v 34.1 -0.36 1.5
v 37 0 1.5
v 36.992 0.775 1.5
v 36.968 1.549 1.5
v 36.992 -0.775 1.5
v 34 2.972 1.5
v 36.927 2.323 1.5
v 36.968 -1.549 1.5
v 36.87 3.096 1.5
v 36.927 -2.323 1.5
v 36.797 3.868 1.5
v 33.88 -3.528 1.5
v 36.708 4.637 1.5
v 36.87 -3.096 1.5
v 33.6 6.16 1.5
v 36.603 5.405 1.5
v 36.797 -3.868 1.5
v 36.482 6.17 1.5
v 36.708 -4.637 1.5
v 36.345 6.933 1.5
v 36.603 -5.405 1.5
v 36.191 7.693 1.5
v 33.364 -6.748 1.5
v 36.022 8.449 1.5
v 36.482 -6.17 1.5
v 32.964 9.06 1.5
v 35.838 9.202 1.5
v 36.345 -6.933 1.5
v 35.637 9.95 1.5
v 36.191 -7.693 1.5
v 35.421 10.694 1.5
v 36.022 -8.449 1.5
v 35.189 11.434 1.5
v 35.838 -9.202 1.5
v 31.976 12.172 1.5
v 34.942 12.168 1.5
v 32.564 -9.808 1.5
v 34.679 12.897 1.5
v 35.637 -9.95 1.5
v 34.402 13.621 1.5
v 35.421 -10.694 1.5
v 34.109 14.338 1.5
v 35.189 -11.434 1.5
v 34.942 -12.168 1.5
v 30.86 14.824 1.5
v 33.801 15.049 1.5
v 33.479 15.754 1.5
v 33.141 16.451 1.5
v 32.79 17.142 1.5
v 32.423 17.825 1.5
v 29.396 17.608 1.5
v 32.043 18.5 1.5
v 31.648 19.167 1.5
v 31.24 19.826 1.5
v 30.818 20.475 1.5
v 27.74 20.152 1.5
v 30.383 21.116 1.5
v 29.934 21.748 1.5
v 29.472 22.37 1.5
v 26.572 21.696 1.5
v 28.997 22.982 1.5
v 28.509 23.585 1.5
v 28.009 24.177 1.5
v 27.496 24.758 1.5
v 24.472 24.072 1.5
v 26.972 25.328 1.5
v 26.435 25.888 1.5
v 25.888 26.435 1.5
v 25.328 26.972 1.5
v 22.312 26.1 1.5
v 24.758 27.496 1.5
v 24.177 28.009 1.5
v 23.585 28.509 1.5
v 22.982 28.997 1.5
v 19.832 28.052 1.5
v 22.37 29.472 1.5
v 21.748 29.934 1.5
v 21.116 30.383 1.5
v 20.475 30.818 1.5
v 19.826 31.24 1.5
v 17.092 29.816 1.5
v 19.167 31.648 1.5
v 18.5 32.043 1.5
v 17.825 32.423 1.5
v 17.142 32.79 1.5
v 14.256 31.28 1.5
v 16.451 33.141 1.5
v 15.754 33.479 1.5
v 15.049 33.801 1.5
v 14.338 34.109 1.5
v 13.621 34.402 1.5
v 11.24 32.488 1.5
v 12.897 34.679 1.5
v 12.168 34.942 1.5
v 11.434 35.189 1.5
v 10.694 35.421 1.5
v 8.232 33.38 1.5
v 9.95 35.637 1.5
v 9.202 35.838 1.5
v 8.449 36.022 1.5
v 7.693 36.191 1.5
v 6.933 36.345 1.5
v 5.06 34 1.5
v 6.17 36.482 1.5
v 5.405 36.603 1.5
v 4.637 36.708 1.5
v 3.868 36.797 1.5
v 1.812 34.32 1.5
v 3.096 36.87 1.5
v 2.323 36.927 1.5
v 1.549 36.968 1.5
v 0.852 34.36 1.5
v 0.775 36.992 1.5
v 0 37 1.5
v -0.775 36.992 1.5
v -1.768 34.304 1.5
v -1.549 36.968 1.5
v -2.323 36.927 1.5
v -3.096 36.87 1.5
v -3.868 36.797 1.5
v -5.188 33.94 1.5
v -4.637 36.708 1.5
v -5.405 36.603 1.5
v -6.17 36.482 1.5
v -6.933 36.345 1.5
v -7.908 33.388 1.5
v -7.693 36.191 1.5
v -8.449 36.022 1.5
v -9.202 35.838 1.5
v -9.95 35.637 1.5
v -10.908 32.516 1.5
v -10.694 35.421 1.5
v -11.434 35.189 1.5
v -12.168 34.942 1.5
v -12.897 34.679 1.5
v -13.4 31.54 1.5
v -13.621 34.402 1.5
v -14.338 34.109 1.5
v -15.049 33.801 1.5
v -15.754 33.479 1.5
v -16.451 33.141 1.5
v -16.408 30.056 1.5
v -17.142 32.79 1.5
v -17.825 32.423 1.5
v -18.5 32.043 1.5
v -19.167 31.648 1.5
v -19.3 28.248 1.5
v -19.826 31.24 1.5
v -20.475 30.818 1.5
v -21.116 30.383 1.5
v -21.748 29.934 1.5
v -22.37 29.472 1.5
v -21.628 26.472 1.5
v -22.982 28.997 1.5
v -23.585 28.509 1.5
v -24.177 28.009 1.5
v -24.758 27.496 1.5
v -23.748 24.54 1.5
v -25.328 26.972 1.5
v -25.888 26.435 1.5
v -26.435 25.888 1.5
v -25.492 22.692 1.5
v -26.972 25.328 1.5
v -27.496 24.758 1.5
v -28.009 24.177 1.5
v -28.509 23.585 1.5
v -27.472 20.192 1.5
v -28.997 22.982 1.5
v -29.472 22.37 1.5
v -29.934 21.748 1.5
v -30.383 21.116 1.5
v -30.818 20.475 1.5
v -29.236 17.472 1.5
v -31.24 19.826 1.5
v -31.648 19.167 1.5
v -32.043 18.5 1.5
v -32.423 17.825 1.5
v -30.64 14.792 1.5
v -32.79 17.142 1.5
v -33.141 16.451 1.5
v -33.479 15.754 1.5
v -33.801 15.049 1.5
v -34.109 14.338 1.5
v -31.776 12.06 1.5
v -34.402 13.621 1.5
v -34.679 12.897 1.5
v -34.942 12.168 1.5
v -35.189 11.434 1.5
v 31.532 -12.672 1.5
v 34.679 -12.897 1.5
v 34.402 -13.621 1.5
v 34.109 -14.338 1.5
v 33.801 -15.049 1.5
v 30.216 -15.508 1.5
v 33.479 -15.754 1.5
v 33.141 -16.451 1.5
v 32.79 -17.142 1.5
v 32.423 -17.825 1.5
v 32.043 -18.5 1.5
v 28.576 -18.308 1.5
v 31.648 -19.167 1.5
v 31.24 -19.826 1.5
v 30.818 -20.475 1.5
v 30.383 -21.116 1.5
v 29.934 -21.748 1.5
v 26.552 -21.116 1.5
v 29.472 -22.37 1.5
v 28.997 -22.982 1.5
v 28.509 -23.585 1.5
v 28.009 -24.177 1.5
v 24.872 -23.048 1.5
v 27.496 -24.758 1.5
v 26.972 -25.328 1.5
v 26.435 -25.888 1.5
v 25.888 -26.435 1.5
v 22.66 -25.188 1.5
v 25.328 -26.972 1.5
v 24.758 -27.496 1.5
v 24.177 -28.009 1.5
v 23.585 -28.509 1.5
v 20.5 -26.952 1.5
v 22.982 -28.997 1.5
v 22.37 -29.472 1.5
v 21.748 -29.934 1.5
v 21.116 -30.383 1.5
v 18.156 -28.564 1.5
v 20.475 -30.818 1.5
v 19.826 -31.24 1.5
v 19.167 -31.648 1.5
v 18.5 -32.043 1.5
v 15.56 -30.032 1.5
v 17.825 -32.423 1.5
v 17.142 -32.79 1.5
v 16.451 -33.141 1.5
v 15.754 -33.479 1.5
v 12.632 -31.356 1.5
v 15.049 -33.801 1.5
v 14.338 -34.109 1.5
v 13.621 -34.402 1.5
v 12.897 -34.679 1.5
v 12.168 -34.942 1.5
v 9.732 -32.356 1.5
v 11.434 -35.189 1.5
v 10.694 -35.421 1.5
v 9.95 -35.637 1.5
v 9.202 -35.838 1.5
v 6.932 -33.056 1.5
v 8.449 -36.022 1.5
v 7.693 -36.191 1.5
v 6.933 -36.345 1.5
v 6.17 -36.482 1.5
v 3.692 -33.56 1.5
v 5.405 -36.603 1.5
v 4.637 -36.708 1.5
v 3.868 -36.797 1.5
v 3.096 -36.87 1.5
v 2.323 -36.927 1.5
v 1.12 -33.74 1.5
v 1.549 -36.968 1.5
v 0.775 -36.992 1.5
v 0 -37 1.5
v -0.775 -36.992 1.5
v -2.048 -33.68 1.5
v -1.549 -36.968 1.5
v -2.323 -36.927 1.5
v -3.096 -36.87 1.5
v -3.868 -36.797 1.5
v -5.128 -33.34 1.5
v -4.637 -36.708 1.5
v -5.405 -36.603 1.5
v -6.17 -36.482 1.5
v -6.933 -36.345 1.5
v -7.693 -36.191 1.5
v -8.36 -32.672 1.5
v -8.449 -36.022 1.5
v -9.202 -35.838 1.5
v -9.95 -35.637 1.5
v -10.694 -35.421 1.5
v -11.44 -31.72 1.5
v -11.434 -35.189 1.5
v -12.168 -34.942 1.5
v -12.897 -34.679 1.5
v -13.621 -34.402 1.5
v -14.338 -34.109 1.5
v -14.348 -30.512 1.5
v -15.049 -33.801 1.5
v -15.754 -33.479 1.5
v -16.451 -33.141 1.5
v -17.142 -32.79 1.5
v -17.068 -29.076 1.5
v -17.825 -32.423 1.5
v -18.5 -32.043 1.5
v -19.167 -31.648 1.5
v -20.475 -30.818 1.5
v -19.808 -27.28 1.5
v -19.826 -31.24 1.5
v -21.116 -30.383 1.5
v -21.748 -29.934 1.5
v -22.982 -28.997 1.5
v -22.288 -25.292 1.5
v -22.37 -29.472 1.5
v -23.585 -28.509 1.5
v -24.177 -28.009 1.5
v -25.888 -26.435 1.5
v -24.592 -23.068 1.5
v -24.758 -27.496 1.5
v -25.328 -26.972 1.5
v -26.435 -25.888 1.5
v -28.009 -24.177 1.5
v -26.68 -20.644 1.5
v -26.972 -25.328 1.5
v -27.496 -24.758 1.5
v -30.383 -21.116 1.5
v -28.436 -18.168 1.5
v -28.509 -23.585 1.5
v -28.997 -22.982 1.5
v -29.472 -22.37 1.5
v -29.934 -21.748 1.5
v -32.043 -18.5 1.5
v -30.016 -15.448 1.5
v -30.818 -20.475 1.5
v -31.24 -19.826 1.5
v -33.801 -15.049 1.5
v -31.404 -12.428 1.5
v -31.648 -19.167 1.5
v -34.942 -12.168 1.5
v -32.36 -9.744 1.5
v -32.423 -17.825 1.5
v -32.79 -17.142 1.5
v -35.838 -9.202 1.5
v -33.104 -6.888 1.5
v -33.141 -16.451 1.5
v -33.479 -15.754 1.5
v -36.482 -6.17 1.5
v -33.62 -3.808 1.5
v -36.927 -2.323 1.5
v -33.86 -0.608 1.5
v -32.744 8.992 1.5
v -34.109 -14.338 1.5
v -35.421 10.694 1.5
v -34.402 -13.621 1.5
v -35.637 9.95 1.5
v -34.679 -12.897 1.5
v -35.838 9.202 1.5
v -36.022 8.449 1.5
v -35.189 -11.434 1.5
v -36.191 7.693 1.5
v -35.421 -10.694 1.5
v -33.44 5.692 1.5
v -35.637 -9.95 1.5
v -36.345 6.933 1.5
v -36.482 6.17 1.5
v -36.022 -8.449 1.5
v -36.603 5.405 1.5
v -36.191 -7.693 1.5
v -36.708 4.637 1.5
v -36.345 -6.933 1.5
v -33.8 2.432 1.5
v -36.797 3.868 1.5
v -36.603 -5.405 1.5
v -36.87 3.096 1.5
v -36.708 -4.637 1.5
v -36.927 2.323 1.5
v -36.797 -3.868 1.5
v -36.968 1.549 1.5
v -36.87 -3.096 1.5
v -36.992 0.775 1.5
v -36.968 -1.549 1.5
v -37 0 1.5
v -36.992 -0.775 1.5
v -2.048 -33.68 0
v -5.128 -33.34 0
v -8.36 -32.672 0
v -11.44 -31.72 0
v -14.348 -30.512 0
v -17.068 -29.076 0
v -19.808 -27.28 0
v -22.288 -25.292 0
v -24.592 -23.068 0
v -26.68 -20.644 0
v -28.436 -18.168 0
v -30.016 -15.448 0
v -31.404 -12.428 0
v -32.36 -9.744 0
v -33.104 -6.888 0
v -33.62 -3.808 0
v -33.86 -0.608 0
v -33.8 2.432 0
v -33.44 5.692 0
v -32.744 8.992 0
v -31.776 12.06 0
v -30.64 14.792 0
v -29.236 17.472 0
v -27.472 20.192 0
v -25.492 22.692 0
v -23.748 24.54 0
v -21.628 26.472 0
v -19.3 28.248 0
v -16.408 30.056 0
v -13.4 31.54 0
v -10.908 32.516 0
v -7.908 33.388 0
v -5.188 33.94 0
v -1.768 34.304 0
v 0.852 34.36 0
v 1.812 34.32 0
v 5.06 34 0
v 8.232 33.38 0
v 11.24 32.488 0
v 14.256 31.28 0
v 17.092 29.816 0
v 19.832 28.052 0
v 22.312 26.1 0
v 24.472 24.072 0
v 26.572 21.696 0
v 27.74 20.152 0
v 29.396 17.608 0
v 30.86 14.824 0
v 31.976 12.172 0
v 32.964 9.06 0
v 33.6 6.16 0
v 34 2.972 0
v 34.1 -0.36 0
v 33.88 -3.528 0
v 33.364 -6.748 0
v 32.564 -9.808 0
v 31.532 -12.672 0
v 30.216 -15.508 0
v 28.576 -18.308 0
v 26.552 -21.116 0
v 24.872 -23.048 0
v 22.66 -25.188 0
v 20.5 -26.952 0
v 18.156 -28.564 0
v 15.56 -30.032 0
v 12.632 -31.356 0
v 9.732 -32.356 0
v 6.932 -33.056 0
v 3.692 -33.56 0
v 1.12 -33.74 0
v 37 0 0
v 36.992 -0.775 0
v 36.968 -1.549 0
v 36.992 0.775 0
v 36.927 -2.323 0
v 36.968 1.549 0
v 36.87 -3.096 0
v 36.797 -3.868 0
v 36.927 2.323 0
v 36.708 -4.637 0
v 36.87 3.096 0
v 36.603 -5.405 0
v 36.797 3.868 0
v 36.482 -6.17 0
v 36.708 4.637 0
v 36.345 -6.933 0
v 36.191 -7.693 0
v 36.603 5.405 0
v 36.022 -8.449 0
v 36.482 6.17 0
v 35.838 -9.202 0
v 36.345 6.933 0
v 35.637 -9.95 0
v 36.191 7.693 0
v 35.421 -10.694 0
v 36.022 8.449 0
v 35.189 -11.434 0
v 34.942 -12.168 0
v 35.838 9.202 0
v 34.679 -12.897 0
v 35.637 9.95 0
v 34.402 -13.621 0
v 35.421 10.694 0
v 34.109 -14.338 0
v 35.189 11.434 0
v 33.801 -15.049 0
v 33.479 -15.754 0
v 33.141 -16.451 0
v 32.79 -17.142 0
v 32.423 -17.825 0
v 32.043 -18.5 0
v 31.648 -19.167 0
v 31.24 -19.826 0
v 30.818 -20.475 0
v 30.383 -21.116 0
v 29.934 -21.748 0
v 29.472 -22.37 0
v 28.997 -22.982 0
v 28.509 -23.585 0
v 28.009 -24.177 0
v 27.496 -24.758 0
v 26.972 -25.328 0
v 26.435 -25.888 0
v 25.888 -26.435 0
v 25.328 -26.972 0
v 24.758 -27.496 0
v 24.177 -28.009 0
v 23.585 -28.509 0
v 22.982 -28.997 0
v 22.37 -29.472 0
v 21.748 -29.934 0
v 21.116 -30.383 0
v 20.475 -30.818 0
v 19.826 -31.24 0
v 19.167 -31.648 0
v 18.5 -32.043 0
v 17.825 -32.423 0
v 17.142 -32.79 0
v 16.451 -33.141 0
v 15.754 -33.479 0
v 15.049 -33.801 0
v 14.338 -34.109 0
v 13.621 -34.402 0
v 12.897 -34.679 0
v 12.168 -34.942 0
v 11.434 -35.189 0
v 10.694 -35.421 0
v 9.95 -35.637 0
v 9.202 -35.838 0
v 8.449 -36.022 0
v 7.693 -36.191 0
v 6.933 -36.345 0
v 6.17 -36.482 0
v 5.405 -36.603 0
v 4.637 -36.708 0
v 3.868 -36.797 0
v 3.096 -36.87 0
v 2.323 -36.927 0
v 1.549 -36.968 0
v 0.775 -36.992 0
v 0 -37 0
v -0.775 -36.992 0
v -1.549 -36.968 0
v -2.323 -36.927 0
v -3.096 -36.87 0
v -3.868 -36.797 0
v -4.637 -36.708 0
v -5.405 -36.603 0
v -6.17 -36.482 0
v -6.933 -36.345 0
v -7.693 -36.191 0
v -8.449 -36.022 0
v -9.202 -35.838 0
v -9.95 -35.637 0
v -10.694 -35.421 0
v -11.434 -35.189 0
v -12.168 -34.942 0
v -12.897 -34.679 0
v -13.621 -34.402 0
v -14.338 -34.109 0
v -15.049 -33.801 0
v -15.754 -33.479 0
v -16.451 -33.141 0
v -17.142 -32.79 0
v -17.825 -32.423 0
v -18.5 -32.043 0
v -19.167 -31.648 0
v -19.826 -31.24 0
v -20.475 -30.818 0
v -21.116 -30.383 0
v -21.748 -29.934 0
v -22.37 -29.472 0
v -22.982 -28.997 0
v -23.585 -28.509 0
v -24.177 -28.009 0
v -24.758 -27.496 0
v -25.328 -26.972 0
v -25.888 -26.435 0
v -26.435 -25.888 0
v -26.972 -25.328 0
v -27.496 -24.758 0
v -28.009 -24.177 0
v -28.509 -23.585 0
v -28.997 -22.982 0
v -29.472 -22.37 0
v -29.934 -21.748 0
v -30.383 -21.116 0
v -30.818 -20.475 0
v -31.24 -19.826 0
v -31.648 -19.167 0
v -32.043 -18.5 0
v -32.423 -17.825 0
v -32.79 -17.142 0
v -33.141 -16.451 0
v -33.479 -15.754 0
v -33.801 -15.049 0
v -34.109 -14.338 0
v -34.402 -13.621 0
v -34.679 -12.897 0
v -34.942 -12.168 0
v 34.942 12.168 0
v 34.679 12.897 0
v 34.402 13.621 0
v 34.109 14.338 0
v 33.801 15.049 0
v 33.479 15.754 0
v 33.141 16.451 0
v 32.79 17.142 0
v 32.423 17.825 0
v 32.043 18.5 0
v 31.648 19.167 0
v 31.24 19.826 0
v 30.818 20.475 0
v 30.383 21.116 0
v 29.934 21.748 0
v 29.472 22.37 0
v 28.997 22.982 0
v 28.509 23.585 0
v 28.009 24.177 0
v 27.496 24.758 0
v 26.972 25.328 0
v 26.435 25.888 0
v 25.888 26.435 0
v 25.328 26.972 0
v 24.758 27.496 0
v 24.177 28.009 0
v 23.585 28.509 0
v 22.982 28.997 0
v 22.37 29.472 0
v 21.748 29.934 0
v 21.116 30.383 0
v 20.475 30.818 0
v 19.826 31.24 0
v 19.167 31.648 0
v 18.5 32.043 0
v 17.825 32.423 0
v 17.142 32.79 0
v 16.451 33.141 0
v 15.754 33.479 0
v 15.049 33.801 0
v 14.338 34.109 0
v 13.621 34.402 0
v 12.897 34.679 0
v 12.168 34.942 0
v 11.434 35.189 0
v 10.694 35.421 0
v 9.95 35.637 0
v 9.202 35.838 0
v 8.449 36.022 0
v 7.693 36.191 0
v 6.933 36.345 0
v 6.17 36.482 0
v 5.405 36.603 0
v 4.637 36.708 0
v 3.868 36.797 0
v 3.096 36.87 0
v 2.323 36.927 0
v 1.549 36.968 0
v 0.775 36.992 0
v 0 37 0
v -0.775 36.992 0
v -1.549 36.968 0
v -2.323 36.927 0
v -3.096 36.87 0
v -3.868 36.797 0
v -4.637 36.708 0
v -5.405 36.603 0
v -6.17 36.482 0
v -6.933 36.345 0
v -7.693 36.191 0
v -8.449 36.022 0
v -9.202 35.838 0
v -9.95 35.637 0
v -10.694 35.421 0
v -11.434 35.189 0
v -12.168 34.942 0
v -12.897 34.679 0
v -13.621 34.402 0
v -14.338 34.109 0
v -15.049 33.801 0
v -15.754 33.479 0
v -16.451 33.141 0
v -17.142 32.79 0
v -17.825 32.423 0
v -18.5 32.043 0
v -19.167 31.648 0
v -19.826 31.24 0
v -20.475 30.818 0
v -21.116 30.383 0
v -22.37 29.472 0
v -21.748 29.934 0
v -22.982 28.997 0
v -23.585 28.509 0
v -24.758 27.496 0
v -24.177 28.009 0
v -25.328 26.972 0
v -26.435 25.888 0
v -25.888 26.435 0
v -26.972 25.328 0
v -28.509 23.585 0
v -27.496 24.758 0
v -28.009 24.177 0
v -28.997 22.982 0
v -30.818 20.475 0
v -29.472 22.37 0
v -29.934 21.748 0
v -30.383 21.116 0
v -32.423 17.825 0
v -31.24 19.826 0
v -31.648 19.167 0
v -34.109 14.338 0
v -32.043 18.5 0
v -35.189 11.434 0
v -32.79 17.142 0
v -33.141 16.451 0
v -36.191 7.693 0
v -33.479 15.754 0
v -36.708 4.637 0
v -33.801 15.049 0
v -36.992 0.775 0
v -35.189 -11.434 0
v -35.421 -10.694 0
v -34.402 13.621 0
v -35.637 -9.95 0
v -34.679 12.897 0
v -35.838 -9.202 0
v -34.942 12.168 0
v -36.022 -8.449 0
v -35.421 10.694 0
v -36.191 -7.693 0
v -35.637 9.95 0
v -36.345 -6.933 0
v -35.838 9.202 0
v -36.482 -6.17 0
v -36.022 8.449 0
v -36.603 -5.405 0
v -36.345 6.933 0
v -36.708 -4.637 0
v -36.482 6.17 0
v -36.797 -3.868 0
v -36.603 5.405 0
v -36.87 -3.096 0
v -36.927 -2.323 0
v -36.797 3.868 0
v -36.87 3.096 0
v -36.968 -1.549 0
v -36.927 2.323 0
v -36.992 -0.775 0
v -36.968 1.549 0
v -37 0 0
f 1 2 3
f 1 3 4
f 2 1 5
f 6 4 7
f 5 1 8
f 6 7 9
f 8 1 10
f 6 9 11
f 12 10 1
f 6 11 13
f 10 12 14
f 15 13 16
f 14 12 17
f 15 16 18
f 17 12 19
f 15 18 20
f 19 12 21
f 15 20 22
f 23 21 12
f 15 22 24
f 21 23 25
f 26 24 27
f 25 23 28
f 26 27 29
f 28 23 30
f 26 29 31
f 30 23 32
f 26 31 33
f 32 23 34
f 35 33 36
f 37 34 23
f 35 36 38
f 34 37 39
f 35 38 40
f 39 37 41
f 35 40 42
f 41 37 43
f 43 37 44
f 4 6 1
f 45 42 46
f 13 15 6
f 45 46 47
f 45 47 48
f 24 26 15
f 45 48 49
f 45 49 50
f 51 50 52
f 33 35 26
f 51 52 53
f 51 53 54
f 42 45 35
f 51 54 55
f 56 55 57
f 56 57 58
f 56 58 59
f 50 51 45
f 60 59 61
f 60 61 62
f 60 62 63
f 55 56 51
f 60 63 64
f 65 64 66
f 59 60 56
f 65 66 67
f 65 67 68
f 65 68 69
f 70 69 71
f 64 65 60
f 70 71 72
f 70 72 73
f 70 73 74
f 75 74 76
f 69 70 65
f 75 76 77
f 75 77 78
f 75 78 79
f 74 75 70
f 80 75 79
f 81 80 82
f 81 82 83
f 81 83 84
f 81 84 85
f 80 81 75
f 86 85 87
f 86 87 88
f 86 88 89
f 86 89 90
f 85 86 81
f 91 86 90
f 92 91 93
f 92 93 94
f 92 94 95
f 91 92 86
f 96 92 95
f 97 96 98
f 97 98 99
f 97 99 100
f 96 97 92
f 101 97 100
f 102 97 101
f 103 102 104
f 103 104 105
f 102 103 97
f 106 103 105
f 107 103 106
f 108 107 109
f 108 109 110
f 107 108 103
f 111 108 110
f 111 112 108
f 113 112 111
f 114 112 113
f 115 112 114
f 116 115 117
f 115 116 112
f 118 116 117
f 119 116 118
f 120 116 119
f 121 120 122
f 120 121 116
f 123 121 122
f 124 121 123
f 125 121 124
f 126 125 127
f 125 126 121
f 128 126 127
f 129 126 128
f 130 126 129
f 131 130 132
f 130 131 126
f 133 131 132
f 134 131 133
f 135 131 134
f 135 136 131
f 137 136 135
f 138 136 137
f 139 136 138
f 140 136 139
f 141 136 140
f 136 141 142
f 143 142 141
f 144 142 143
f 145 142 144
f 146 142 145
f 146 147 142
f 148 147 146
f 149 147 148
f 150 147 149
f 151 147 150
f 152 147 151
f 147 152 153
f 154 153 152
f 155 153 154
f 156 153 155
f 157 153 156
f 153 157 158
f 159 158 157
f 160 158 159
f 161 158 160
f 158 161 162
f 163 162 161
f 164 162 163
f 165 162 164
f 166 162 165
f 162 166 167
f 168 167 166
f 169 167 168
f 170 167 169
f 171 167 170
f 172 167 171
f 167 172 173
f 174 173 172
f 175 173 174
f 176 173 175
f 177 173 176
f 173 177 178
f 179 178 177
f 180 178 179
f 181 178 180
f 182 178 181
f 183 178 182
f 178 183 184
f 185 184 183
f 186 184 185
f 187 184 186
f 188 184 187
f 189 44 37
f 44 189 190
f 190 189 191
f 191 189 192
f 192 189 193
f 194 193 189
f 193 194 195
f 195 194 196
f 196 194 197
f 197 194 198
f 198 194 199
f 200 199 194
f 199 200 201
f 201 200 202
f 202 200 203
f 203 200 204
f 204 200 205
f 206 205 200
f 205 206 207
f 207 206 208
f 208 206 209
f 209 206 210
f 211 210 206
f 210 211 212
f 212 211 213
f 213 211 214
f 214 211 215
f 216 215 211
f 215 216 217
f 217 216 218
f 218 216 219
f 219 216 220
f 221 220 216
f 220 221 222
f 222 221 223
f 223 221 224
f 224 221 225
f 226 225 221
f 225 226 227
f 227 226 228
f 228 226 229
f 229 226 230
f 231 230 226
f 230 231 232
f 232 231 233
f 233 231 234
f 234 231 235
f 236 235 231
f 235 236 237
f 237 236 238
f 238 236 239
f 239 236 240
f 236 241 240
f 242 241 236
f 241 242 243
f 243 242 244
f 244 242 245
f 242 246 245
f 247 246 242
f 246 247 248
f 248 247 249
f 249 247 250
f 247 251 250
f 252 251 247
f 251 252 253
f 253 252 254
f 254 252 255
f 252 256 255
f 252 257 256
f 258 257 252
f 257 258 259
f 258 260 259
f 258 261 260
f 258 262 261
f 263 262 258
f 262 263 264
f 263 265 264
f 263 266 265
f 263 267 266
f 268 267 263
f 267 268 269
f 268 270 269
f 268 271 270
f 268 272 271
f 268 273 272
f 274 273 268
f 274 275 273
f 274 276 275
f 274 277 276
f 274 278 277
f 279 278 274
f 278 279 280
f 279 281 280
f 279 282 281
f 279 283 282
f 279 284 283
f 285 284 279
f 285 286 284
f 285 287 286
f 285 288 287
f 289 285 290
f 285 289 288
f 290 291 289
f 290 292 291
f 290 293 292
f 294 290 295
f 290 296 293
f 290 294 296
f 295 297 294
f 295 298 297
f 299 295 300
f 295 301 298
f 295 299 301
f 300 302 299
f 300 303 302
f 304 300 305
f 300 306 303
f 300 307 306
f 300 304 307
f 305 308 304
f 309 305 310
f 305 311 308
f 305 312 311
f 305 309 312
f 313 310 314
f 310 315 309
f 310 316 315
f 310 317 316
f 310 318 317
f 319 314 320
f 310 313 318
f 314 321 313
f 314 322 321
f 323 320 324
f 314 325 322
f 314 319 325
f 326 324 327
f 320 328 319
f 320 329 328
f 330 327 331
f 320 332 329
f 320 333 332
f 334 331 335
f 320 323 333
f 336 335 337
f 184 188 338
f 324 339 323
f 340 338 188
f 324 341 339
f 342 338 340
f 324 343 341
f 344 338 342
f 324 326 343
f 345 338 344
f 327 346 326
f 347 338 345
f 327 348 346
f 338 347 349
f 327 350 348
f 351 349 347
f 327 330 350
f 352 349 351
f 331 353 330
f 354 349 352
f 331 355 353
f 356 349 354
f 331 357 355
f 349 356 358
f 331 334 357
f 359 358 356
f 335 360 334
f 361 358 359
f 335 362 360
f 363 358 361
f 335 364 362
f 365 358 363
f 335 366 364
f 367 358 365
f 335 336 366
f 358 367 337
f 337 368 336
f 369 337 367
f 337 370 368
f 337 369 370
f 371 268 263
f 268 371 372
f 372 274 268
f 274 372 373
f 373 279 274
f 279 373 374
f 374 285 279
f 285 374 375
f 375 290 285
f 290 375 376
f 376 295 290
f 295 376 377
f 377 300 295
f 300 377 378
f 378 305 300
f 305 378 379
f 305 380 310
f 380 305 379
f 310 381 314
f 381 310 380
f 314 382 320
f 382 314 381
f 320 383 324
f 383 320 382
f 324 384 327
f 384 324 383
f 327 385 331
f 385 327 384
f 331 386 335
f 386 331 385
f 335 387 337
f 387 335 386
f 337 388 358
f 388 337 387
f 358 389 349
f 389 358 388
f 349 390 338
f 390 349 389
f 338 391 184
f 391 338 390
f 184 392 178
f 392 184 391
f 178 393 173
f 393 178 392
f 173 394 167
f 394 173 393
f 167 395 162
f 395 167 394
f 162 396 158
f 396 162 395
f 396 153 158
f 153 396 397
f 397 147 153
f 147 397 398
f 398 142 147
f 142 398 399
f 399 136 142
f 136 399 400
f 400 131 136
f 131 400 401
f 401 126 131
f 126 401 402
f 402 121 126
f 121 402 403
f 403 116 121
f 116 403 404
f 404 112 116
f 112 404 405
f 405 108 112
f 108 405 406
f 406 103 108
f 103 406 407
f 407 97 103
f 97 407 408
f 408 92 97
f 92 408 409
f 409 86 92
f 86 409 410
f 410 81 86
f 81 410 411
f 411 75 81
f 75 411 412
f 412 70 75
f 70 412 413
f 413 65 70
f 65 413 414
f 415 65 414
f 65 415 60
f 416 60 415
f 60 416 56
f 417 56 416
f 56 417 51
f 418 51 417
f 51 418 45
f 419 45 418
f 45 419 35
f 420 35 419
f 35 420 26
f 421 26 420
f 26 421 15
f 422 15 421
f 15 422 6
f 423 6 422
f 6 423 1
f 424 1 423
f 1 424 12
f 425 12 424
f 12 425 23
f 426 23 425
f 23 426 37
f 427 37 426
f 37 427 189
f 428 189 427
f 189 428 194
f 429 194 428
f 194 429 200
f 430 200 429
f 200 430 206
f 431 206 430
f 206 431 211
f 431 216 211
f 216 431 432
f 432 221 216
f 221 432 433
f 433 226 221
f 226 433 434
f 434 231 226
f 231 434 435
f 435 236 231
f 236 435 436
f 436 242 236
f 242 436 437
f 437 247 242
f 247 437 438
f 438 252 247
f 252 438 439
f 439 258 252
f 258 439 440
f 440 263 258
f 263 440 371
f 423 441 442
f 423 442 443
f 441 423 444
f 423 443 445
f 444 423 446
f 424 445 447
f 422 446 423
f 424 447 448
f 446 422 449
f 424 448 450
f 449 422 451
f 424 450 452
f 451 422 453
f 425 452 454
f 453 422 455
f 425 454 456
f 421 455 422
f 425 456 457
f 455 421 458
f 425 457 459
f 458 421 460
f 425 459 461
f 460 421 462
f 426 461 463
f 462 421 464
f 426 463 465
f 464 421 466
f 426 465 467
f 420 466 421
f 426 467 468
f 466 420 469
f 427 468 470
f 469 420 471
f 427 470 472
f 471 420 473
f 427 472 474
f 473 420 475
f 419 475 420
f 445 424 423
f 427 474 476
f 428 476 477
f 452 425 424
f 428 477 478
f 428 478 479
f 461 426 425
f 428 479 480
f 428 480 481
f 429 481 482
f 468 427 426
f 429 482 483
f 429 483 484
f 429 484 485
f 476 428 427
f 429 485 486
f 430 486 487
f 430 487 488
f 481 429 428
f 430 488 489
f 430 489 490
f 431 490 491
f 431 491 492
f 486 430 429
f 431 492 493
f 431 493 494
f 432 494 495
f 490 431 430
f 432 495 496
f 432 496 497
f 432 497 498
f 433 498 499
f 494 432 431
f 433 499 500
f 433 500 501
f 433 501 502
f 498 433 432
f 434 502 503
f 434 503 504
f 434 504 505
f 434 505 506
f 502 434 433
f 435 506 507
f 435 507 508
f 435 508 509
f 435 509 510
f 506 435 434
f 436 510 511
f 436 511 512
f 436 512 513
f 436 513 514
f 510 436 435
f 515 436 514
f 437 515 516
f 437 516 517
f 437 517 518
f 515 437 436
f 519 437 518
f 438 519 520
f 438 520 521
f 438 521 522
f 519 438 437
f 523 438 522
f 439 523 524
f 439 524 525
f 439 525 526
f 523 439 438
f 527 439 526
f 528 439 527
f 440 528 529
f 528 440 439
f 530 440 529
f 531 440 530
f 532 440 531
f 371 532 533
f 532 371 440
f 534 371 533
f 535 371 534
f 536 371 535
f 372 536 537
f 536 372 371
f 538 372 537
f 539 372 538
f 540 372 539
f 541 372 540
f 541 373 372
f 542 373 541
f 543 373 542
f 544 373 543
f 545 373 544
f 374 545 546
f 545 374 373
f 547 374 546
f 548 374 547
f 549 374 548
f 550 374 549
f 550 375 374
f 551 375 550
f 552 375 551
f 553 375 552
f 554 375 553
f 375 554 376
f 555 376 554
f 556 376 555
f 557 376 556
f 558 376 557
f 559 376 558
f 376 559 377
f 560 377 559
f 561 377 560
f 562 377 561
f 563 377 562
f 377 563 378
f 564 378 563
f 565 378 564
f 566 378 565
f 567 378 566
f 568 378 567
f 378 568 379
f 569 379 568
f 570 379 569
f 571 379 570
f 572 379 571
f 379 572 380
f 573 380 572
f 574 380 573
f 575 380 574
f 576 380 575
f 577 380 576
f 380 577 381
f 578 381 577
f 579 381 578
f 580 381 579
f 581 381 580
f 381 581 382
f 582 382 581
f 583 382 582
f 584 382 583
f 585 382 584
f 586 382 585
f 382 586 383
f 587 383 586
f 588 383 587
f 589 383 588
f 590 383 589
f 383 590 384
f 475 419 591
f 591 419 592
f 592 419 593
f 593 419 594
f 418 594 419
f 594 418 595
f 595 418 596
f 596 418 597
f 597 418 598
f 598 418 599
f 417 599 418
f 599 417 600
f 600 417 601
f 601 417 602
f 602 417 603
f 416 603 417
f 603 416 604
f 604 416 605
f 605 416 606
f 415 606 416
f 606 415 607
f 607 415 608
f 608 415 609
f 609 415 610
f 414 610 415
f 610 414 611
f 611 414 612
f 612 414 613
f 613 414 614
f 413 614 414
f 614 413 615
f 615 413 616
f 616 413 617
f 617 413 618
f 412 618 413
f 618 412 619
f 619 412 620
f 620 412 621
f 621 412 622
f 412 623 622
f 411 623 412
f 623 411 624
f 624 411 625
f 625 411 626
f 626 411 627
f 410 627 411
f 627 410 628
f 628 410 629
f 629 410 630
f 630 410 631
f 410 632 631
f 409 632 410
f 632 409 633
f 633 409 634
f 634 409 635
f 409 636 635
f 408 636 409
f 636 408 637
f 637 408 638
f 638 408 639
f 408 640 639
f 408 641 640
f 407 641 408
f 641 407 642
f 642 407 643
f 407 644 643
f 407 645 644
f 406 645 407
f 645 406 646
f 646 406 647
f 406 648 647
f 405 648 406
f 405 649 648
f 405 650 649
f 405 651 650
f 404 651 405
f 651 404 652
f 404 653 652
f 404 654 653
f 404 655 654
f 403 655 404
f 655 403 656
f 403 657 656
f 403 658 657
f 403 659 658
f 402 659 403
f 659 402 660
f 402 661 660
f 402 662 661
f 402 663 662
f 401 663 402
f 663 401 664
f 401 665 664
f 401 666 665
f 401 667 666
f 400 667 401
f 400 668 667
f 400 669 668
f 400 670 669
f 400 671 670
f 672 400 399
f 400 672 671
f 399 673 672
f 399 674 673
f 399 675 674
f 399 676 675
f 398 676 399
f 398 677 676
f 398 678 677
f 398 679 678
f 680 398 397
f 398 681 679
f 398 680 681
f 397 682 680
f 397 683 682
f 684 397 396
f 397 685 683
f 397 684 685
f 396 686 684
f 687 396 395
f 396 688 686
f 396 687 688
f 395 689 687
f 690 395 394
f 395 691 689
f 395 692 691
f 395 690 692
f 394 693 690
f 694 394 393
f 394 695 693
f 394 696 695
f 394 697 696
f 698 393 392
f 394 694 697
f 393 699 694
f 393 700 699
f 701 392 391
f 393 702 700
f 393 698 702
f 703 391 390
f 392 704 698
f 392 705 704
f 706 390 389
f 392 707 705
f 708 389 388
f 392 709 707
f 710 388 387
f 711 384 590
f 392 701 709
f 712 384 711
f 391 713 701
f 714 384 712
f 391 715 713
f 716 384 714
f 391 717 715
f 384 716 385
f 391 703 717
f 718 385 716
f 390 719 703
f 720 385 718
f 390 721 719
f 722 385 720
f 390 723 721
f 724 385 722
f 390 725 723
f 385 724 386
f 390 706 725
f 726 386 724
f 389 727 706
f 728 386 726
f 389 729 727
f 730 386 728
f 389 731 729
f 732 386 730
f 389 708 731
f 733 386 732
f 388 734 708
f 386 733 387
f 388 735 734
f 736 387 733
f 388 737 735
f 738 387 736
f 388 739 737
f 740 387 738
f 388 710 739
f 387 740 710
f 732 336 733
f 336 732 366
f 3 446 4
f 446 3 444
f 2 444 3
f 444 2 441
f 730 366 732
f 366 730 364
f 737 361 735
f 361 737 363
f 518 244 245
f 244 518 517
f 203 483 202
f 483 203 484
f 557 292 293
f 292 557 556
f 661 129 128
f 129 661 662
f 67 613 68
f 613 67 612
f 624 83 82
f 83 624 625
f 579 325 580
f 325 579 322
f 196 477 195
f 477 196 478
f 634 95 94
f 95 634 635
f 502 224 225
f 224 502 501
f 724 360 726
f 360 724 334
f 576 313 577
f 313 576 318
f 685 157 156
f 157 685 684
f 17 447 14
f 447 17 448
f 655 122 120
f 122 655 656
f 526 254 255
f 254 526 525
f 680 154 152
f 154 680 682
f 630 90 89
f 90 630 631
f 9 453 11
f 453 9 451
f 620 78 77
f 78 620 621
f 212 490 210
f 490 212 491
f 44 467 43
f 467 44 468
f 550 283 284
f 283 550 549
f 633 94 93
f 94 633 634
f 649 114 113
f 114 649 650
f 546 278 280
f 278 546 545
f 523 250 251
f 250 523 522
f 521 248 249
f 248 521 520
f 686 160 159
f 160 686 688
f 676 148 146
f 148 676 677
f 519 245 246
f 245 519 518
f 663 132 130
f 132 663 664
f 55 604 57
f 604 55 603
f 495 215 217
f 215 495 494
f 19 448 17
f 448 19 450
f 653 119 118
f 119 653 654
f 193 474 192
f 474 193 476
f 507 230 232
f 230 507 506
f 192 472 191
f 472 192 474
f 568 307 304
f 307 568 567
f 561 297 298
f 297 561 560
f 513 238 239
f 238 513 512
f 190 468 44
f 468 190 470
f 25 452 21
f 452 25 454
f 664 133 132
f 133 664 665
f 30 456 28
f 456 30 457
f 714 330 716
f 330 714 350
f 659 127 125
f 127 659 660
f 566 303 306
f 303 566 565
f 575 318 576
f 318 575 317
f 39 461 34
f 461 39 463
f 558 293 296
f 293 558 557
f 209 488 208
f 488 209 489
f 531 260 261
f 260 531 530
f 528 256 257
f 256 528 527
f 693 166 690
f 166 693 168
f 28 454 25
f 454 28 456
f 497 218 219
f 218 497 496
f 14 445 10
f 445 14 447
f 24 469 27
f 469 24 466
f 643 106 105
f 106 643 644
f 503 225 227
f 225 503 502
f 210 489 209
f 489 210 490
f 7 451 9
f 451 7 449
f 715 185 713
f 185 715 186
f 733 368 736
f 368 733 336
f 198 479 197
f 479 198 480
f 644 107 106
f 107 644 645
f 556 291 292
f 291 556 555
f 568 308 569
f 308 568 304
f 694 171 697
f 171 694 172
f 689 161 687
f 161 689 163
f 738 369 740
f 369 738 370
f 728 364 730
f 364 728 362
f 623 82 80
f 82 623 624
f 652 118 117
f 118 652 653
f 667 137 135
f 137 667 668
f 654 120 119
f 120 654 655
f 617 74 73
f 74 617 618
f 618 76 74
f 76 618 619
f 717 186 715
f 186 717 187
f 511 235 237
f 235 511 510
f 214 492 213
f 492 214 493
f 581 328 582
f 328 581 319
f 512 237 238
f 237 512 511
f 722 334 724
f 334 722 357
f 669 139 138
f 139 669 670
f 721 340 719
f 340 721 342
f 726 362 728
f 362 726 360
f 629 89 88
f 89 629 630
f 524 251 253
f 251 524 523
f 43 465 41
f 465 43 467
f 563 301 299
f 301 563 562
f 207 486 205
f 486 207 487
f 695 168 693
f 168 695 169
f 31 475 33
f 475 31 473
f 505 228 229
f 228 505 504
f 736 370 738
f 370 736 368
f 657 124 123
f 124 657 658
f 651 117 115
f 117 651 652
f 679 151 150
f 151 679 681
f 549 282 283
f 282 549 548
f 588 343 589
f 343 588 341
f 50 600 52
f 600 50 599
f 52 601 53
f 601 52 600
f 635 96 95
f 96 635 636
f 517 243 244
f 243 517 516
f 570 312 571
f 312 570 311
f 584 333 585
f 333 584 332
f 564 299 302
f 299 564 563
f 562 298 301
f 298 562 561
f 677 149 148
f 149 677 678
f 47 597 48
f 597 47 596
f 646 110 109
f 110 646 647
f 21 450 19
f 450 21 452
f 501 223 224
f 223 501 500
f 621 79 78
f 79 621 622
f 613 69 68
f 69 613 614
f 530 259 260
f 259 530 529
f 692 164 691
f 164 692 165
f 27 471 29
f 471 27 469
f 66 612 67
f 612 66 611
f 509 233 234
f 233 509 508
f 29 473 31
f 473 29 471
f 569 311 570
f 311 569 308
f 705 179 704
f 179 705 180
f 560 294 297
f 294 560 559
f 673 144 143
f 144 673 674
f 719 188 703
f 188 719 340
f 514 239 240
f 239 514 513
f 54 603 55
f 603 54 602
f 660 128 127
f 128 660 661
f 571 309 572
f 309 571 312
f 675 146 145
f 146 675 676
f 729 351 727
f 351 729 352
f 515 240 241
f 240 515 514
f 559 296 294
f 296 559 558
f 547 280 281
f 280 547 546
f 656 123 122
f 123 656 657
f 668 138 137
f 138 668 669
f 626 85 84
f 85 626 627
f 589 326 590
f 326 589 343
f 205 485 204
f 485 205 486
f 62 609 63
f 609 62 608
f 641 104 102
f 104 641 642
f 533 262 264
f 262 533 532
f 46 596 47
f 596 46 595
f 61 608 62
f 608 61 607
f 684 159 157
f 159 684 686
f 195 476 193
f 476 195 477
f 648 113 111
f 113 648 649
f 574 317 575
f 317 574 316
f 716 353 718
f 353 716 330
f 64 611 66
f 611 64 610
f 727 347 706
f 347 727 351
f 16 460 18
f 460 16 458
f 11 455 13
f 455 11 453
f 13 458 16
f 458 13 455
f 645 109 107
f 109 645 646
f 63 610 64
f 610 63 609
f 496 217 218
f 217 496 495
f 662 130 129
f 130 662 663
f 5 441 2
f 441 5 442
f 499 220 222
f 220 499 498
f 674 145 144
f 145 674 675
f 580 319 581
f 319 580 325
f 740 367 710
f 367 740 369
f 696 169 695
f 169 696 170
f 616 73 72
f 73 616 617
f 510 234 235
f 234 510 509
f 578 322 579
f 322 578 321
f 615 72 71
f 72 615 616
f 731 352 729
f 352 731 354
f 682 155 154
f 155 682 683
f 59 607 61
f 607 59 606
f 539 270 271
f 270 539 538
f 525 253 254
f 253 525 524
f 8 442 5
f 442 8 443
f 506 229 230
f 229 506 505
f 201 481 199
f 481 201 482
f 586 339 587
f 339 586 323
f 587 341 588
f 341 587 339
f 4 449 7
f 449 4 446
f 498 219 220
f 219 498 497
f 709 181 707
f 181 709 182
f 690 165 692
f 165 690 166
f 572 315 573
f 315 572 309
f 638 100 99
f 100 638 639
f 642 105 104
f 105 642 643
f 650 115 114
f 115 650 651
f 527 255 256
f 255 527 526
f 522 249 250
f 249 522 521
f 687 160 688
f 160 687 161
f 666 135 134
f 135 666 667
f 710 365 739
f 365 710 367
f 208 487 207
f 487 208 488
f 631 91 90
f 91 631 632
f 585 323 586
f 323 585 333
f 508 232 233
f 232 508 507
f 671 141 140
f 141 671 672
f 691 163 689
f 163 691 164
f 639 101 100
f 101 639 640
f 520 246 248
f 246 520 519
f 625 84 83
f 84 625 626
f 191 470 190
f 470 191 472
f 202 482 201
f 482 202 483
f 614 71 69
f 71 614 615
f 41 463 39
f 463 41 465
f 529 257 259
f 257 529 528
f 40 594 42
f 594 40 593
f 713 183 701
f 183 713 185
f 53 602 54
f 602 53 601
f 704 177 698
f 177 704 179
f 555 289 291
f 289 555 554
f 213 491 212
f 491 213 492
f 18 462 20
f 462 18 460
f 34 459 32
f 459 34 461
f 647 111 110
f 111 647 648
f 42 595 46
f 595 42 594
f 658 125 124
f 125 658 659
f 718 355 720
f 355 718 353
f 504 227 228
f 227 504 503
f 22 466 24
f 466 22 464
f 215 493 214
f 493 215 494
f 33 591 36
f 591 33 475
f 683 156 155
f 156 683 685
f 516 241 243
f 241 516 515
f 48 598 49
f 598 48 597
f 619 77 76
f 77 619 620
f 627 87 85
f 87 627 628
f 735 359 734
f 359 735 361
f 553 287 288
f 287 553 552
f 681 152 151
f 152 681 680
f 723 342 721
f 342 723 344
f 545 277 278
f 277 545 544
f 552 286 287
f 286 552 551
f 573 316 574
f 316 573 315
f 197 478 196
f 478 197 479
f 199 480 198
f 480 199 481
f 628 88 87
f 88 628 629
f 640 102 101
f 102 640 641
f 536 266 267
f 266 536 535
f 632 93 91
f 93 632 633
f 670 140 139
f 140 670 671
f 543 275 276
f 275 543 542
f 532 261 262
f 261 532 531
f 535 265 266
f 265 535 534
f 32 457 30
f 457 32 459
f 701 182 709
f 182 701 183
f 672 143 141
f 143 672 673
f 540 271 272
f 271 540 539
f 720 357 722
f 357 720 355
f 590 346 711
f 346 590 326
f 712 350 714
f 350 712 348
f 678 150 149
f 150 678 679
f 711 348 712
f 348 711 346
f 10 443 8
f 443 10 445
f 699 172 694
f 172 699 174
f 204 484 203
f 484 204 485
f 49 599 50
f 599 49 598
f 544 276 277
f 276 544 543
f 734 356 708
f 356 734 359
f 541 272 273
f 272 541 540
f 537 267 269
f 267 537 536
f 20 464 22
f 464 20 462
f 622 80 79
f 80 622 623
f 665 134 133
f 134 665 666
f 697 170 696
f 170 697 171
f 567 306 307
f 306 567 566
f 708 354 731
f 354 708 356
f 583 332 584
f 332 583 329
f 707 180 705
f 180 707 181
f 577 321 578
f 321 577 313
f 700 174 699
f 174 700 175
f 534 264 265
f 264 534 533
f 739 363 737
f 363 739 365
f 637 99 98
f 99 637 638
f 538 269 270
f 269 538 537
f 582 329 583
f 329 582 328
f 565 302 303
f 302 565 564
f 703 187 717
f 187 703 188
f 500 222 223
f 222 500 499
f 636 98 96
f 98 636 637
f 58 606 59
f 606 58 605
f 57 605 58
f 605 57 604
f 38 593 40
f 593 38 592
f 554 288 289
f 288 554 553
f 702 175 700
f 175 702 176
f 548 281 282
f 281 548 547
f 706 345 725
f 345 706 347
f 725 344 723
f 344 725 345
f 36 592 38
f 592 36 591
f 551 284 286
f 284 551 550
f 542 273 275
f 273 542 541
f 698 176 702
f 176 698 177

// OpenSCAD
// file: CrickCoin3text.scad
module CrickCoin3text_1()
{
 /* Generated by trace2scad version 20150415
    http://aggregate.org/MAKE/TRACE2SCAD/
    Optimized model has 221/1642 original points
 */
 color([0.5, 0.5, 0.5])
 assign(minx=0) /* polygon minx=0 */
 assign(miny=0) /* polygon miny=0 */
 assign(maxx=20000) /* polygon maxx=20000 */
 assign(maxy=19690) /* polygon maxy=19690 */
 assign(dx=maxx-minx)
 assign(dy=maxy-miny)
 assign(maxd=((dx>dy)?dx:dy))
 scale([1/maxd, 1/maxd, 1])
 translate([-minx-dx/2, -miny-dy/2, 0])
 linear_extrude(height=1, convexity=221)
 union() {
  union() {
   polygon([[1,18799],[3,17908],[221,17839],[472,17805],[701,17833],[908,17890],[1153,18025],[1430,18292],[1584,18588],[1629,18742],[1660,18993],[1623,19271],[1575,19428],[1438,19676],[1425,19690],[0,19690]], convexity=5);
   polygon([[18275,19684],[18275,19678],[18190,19480],[18139,19274],[18133,19174],[18133,19061],[18165,18838],[18210,18684],[18345,18443],[18390,18373],[18617,18160],[18878,18016],[19060,17965],[19152,17947],[19364,17930],[19474,17948],[19726,18011],[20000,18151],[20000,19690],[18275,19690]], convexity=7);
   polygon([[5228,15624],[5158,15620],[4708,15554],[4315,15427],[3984,15245],[3742,15043],[3520,14774],[3360,14466],[3256,14108],[3214,13813],[3222,13351],[3301,12933],[3432,12608],[3588,12359],[3823,12108],[4113,11902],[4473,11740],[4903,11636],[5413,11596],[5925,11637],[6365,11734],[6600,11812],[6600,11843],[6633,11863],[6675,11943],[6680,12698],[6631,12836],[6537,12895],[6467,12895],[6383,12853],[6297,12719],[6272,12683],[6130,12598],[6061,12539],[5783,12485],[5482,12480],[5238,12513],[4977,12614],[4779,12768],[4635,12954],[4535,13193],[4485,13501],[4495,13846],[4569,14133],[4691,14361],[4883,14554],[5093,14669],[5373,14740],[5723,14750],[5876,14720],[6100,14613],[6472,14363],[6542,14345],[6618,14365],[6669,14396],[6705,14471],[6690,14813],[6685,15328],[6619,15433],[6518,15495],[6353,15522],[6289,15551],[6103,15554],[5678,15620],[5298,15628]], convexity=12);
   polygon([[11264,15383],[11226,15363],[11170,15267],[11170,15098],[11258,14950],[11365,14778],[11475,14418],[11970,12538],[11977,12212],[12039,12104],[12107,12070],[12200,12060],[12308,12055],[12411,12068],[13148,12050],[13229,12095],[13270,12175],[13260,12274],[13244,12287],[13265,12463],[13617,13886],[13693,13940],[13753,13940],[13823,13878],[14145,12562],[14154,12418],[14160,12268],[14155,12184],[14210,12094],[14277,12060],[14898,12075],[15128,12081],[15186,12050],[15268,12050],[15356,12108],[15410,12205],[15410,12328],[16026,14638],[16100,14845],[16157,14984],[16225,15133],[16225,15204],[16173,15294],[16098,15330],[15762,15300],[15674,15289],[15604,15310],[15265,15320],[15174,15265],[15140,15198],[15126,14998],[15056,14643],[14752,13441],[14723,13395],[14639,13404],[14586,13443],[14295,14623],[14270,14915],[14240,15028],[14235,15088],[14240,15173],[14178,15280],[14103,15320],[13465,15310],[13389,15330],[13317,15312],[13265,15279],[13225,15201],[13208,14898],[12858,13498],[12798,13450],[12696,13460],[12652,13509],[12367,14720],[12350,14890],[12330,14925],[12323,15013],[12305,15051],[12305,15198],[12248,15301],[12170,15340],[11868,15335],[11468,15361],[11379,15405],[11303,15404]], convexity=31);
   polygon([[19317,1895],[19313,1891],[19054,1852],[18793,1743],[18637,1640],[18420,1407],[18319,1238],[18230,1004],[18192,716],[18215,488],[18257,332],[18390,63],[18428,3],[20000,0],[20000,1719],[19773,1825],[19567,1880],[19322,1900]], convexity=6);
   polygon([[417,1770],[413,1766],[194,1738],[3,1672],[0,0],[1498,0],[1595,225],[1629,342],[1650,479],[1655,643],[1623,863],[1544,1085],[1415,1303],[1173,1545],[875,1700],[665,1755],[422,1775]], convexity=5);
  }
 }
}

module CrickCoin3text()
{
 /* all layers combined, scaled to within a 1mm cube */
 scale([1, 1, 1/1])
 difference() {
  union() {
   scale([1,1,2]) translate([0,0,-0.5]) CrickCoin3text_1();
  }
  translate([0,0,-2]) cube([2,2,4],center=true);
 }
}
CrickCoin3text();
// file: CrickCoin3white.scad
module CrickCoin3white_1()
{
 /* Generated by trace2scad version 20150415
    http://aggregate.org/MAKE/TRACE2SCAD/
    Optimized model has 217/2306 original points
 */
 color([0.5, 0.5, 0.5])
 assign(minx=0) /* polygon minx=0 */
 assign(miny=0) /* polygon miny=0 */
 assign(maxx=20000) /* polygon maxx=20000 */
 assign(maxy=19690) /* polygon maxy=19690 */
 assign(dx=maxx-minx)
 assign(dy=maxy-miny)
 assign(maxd=((dx>dy)?dx:dy))
 scale([1/maxd, 1/maxd, 1])
 translate([-minx-dx/2, -miny-dy/2, 0])
 linear_extrude(height=1, convexity=217)
 union() {
  union() {
   polygon([[1,18799],[3,17908],[221,17839],[472,17805],[701,17833],[908,17890],[1153,18025],[1430,18292],[1584,18588],[1629,18742],[1660,18993],[1623,19271],[1575,19428],[1438,19676],[1425,19690],[0,19690]], convexity=5);
   polygon([[18275,19684],[18275,19678],[18190,19480],[18139,19274],[18133,19174],[18133,19061],[18165,18838],[18210,18684],[18345,18443],[18390,18373],[18617,18160],[18878,18016],[19060,17965],[19152,17947],[19364,17930],[19474,17948],[19726,18011],[20000,18151],[20000,19690],[18275,19690]], convexity=7);
   union() {
    difference() {
     polygon([[9773,19182],[9718,19180],[8873,19120],[7988,18976],[7175,18765],[6498,18531],[5833,18244],[5096,17850],[4363,17369],[3699,16841],[3097,16268],[2607,15718],[2098,15036],[1666,14338],[1281,13563],[979,12783],[740,11942],[589,11128],[510,10283],[504,9644],[560,8823],[704,7938],[915,7135],[1174,6408],[1514,5663],[1945,4913],[2375,4295],[2908,3651],[3556,3003],[4169,2493],[4825,2033],[5523,1629],[6286,1270],[7128,965],[7968,745],[8790,607],[9468,546],[9981,529],[10883,575],[11771,700],[12613,899],[13443,1176],[14106,1460],[14877,1872],[15563,2320],[16203,2822],[16744,3324],[17328,3964],[17799,4583],[18245,5288],[18623,6023],[18921,6753],[19154,7498],[19328,8298],[19430,9088],[19466,9859],[19420,10743],[19299,11583],[19115,12358],[18863,13123],[18575,13801],[18159,14578],[17698,15275],[17248,15848],[16943,16192],[16371,16747],[15728,17275],[15083,17719],[14408,18105],[13608,18475],[12805,18760],[11998,18971],[11133,19115],[10288,19180],[9828,19184]], convexity=6);
     polygon([[10333,18430],[10453,18425],[11265,18345],[12058,18190],[12810,17967],[13564,17665],[14273,17299],[14958,16858],[15578,16370],[16118,15863],[16643,15269],[16935,14883],[17349,14247],[17715,13551],[17994,12888],[18241,12110],[18400,11385],[18500,10588],[18525,9755],[18470,8963],[18341,8158],[18141,7393],[17883,6677],[17554,5968],[17144,5268],[16638,4566],[16218,4083],[15665,3548],[15125,3107],[14539,2704],[13890,2337],[13158,2006],[12433,1756],[11733,1581],[10923,1455],[10280,1410],[9488,1425],[8718,1510],[7910,1677],[7140,1915],[6413,2217],[5733,2576],[5048,3025],[4428,3522],[3852,4078],[3330,4684],[2891,5303],[2496,5983],[2149,6738],[1910,7409],[1724,8123],[1595,8893],[1535,9693],[1550,10453],[1640,11268],[1814,12093],[2056,12860],[2340,13543],[2691,14213],[3132,14893],[3627,15518],[4063,15980],[4593,16463],[5175,16907],[5898,17359],[6650,17730],[7273,17974],[8023,18192],[8703,18330],[9558,18421],[10213,18435]], convexity=6);
    }
   }
   polygon([[19317,1895],[19313,1891],[19054,1852],[18793,1743],[18637,1640],[18420,1407],[18319,1238],[18230,1004],[18192,716],[18215,488],[18257,332],[18390,63],[18428,3],[20000,0],[20000,1719],[19773,1825],[19567,1880],[19322,1900]], convexity=6);
   polygon([[417,1770],[413,1766],[194,1738],[3,1672],[0,0],[1498,0],[1595,225],[1629,342],[1650,479],[1655,643],[1623,863],[1544,1085],[1415,1303],[1173,1545],[875,1700],[665,1755],[422,1775]], convexity=5);
  }
 }
}

module CrickCoin3white()
{
 /* all layers combined, scaled to within a 1mm cube */
 scale([1, 1, 1/1])
 difference() {
  union() {
   scale([1,1,2]) translate([0,0,-0.5]) CrickCoin3white_1();
  }
  translate([0,0,-2]) cube([2,2,4],center=true);
 }
}
CrickCoin3white();
// file: CrickCoin3purple.scad
module CrickCoin3purple_1()
{
 /* Generated by trace2scad version 20150415
    http://aggregate.org/MAKE/TRACE2SCAD/
    Optimized model has 222/2741 original points
 */
 color([0.5, 0.5, 0.5])
 assign(minx=0) /* polygon minx=0 */
 assign(miny=0) /* polygon miny=0 */
 assign(maxx=20000) /* polygon maxx=20000 */
 assign(maxy=19690) /* polygon maxy=19690 */
 assign(dx=maxx-minx)
 assign(dy=maxy-miny)
 assign(maxd=((dx>dy)?dx:dy))
 scale([1/maxd, 1/maxd, 1])
 translate([-minx-dx/2, -miny-dy/2, 0])
 linear_extrude(height=1, convexity=222)
 union() {
  union() {
   polygon([[1,18799],[3,17908],[221,17839],[472,17805],[701,17833],[908,17890],[1153,18025],[1430,18292],[1584,18588],[1629,18742],[1660,18993],[1623,19271],[1575,19428],[1438,19676],[1425,19690],[0,19690]], convexity=5);
   polygon([[18275,19684],[18275,19678],[18190,19480],[18139,19274],[18133,19174],[18133,19061],[18165,18838],[18210,18684],[18345,18443],[18390,18373],[18617,18160],[18878,18016],[19060,17965],[19152,17947],[19364,17930],[19474,17948],[19726,18011],[20000,18151],[20000,19690],[18275,19690]], convexity=7);
   polygon([[9996,13904],[9990,13898],[9902,13891],[9824,13848],[9790,13741],[9838,13664],[10135,13537],[10175,13478],[10166,13278],[9998,13209],[9730,13115],[9545,13050],[9348,13000],[9234,12968],[9115,12935],[8985,12905],[8755,12840],[8307,12745],[7794,12618],[7613,12561],[7220,12385],[7118,12299],[7050,12187],[7014,11943],[7120,11671],[7284,11507],[7538,11395],[7803,11300],[8429,11120],[8815,11025],[9432,10875],[10010,10680],[10230,10532],[10280,10444],[10270,10330],[10218,10250],[9993,10135],[9598,10081],[9499,10050],[9343,10039],[8637,9925],[8593,9915],[8135,9848],[7503,9745],[6797,9595],[6283,9472],[5435,9235],[5245,9151],[5075,9092],[4732,8912],[4598,8816],[4457,8673],[4324,8432],[4280,8188],[4291,7914],[4390,7449],[4426,7343],[4570,7113],[4640,7010],[4718,6895],[4860,6688],[4935,6589],[5073,6335],[5175,6132],[5210,5984],[5200,5771],[5114,5543],[4992,5385],[4894,5293],[4462,5075],[3887,4890],[3458,4785],[3426,4775],[3300,4748],[3673,4287],[4243,3698],[4847,3183],[5509,2718],[6168,2341],[6855,2027],[7473,1805],[8243,1599],[9025,1470],[9388,1439],[9532,1516],[10159,1845],[10352,1950],[10908,2280],[11339,2651],[11730,3042],[11939,3388],[12035,3788],[12010,4293],[11945,4597],[11862,4835],[11713,5203],[11406,5658],[11123,5919],[10673,6245],[10378,6509],[10187,6653],[9942,6853],[9773,7025],[9628,7153],[9305,7489],[9205,7625],[9124,7858],[9123,8125],[9188,8302],[9338,8491],[9528,8631],[9792,8771],[10183,8911],[10693,9045],[11270,9185],[11692,9263],[12178,9355],[13418,9640],[13738,9724],[14099,9903],[14184,10140],[14044,10375],[13710,10595],[13128,10806],[12916,10854],[12775,10883],[11438,11196],[9928,11525],[9377,11724],[9179,11852],[9110,11933],[9095,12033],[9147,12148],[9233,12232],[9468,12379],[9712,12488],[10705,12806],[11264,13044],[11424,13178],[11470,13293],[11408,13405],[11235,13551],[11169,13610],[11085,13657],[11011,13714],[10808,13805],[10708,13820],[10544,13865],[10422,13893],[10373,13910],[10002,13910]], convexity=16);
   polygon([[19317,1895],[19313,1891],[19054,1852],[18793,1743],[18637,1640],[18420,1407],[18319,1238],[18230,1004],[18192,716],[18215,488],[18257,332],[18390,63],[18428,3],[20000,0],[20000,1719],[19773,1825],[19567,1880],[19322,1900]], convexity=6);
   polygon([[417,1770],[413,1766],[194,1738],[3,1672],[0,0],[1498,0],[1595,225],[1629,342],[1650,479],[1655,643],[1623,863],[1544,1085],[1415,1303],[1173,1545],[875,1700],[665,1755],[422,1775]], convexity=5);
  }
 }
}

module CrickCoin3purple()
{
 /* all layers combined, scaled to within a 1mm cube */
 scale([1, 1, 1/1])
 difference() {
  union() {
   scale([1,1,2]) translate([0,0,-0.5]) CrickCoin3purple_1();
  }
  translate([0,0,-2]) cube([2,2,4],center=true);
 }
}
CrickCoin3purple();
// main file
// CrickWooder.scad
//
//------------------------------------------------


use <./CrickCoin3purple.scad>
use <./CrickCoin3white.scad>
use <./CrickCoin3text.scad>

//=====================================================

if(1){
intersection(){
  cylinder(r=37,h=1.5,$fn=300);

  scale([80,80,1.5]){
    
    //color("white")
    CrickCoin3white();
    //color("purple")
    //CrickCoin3purple();
    //color("white")
    //CrickCoin3text();

    }
  }
}

// get black by subtraction so no voids between parts
if(0){
  color("black")
difference(){
  cylinder(r=37,h=1.5,$fn=300);

  translate([0,0,-1])
  scale([80,80,4]){
  
  CrickCoin3purple();
  CrickCoin3white();
  CrickCoin3text();
  
  }
  
}
}

// clear disk bottom
if(0){
  color("cyan",alpha=0.4)
  translate([0,0,-0.3])  
  cylinder(r=36,h=0.3,$fn=300);
}

// clear top bottom
if(0){
  color("cyan",alpha=0.4)
  translate([0,0,1.2])  
  cylinder(r=36,h=0.3,$fn=300);
}


//=====================================================
